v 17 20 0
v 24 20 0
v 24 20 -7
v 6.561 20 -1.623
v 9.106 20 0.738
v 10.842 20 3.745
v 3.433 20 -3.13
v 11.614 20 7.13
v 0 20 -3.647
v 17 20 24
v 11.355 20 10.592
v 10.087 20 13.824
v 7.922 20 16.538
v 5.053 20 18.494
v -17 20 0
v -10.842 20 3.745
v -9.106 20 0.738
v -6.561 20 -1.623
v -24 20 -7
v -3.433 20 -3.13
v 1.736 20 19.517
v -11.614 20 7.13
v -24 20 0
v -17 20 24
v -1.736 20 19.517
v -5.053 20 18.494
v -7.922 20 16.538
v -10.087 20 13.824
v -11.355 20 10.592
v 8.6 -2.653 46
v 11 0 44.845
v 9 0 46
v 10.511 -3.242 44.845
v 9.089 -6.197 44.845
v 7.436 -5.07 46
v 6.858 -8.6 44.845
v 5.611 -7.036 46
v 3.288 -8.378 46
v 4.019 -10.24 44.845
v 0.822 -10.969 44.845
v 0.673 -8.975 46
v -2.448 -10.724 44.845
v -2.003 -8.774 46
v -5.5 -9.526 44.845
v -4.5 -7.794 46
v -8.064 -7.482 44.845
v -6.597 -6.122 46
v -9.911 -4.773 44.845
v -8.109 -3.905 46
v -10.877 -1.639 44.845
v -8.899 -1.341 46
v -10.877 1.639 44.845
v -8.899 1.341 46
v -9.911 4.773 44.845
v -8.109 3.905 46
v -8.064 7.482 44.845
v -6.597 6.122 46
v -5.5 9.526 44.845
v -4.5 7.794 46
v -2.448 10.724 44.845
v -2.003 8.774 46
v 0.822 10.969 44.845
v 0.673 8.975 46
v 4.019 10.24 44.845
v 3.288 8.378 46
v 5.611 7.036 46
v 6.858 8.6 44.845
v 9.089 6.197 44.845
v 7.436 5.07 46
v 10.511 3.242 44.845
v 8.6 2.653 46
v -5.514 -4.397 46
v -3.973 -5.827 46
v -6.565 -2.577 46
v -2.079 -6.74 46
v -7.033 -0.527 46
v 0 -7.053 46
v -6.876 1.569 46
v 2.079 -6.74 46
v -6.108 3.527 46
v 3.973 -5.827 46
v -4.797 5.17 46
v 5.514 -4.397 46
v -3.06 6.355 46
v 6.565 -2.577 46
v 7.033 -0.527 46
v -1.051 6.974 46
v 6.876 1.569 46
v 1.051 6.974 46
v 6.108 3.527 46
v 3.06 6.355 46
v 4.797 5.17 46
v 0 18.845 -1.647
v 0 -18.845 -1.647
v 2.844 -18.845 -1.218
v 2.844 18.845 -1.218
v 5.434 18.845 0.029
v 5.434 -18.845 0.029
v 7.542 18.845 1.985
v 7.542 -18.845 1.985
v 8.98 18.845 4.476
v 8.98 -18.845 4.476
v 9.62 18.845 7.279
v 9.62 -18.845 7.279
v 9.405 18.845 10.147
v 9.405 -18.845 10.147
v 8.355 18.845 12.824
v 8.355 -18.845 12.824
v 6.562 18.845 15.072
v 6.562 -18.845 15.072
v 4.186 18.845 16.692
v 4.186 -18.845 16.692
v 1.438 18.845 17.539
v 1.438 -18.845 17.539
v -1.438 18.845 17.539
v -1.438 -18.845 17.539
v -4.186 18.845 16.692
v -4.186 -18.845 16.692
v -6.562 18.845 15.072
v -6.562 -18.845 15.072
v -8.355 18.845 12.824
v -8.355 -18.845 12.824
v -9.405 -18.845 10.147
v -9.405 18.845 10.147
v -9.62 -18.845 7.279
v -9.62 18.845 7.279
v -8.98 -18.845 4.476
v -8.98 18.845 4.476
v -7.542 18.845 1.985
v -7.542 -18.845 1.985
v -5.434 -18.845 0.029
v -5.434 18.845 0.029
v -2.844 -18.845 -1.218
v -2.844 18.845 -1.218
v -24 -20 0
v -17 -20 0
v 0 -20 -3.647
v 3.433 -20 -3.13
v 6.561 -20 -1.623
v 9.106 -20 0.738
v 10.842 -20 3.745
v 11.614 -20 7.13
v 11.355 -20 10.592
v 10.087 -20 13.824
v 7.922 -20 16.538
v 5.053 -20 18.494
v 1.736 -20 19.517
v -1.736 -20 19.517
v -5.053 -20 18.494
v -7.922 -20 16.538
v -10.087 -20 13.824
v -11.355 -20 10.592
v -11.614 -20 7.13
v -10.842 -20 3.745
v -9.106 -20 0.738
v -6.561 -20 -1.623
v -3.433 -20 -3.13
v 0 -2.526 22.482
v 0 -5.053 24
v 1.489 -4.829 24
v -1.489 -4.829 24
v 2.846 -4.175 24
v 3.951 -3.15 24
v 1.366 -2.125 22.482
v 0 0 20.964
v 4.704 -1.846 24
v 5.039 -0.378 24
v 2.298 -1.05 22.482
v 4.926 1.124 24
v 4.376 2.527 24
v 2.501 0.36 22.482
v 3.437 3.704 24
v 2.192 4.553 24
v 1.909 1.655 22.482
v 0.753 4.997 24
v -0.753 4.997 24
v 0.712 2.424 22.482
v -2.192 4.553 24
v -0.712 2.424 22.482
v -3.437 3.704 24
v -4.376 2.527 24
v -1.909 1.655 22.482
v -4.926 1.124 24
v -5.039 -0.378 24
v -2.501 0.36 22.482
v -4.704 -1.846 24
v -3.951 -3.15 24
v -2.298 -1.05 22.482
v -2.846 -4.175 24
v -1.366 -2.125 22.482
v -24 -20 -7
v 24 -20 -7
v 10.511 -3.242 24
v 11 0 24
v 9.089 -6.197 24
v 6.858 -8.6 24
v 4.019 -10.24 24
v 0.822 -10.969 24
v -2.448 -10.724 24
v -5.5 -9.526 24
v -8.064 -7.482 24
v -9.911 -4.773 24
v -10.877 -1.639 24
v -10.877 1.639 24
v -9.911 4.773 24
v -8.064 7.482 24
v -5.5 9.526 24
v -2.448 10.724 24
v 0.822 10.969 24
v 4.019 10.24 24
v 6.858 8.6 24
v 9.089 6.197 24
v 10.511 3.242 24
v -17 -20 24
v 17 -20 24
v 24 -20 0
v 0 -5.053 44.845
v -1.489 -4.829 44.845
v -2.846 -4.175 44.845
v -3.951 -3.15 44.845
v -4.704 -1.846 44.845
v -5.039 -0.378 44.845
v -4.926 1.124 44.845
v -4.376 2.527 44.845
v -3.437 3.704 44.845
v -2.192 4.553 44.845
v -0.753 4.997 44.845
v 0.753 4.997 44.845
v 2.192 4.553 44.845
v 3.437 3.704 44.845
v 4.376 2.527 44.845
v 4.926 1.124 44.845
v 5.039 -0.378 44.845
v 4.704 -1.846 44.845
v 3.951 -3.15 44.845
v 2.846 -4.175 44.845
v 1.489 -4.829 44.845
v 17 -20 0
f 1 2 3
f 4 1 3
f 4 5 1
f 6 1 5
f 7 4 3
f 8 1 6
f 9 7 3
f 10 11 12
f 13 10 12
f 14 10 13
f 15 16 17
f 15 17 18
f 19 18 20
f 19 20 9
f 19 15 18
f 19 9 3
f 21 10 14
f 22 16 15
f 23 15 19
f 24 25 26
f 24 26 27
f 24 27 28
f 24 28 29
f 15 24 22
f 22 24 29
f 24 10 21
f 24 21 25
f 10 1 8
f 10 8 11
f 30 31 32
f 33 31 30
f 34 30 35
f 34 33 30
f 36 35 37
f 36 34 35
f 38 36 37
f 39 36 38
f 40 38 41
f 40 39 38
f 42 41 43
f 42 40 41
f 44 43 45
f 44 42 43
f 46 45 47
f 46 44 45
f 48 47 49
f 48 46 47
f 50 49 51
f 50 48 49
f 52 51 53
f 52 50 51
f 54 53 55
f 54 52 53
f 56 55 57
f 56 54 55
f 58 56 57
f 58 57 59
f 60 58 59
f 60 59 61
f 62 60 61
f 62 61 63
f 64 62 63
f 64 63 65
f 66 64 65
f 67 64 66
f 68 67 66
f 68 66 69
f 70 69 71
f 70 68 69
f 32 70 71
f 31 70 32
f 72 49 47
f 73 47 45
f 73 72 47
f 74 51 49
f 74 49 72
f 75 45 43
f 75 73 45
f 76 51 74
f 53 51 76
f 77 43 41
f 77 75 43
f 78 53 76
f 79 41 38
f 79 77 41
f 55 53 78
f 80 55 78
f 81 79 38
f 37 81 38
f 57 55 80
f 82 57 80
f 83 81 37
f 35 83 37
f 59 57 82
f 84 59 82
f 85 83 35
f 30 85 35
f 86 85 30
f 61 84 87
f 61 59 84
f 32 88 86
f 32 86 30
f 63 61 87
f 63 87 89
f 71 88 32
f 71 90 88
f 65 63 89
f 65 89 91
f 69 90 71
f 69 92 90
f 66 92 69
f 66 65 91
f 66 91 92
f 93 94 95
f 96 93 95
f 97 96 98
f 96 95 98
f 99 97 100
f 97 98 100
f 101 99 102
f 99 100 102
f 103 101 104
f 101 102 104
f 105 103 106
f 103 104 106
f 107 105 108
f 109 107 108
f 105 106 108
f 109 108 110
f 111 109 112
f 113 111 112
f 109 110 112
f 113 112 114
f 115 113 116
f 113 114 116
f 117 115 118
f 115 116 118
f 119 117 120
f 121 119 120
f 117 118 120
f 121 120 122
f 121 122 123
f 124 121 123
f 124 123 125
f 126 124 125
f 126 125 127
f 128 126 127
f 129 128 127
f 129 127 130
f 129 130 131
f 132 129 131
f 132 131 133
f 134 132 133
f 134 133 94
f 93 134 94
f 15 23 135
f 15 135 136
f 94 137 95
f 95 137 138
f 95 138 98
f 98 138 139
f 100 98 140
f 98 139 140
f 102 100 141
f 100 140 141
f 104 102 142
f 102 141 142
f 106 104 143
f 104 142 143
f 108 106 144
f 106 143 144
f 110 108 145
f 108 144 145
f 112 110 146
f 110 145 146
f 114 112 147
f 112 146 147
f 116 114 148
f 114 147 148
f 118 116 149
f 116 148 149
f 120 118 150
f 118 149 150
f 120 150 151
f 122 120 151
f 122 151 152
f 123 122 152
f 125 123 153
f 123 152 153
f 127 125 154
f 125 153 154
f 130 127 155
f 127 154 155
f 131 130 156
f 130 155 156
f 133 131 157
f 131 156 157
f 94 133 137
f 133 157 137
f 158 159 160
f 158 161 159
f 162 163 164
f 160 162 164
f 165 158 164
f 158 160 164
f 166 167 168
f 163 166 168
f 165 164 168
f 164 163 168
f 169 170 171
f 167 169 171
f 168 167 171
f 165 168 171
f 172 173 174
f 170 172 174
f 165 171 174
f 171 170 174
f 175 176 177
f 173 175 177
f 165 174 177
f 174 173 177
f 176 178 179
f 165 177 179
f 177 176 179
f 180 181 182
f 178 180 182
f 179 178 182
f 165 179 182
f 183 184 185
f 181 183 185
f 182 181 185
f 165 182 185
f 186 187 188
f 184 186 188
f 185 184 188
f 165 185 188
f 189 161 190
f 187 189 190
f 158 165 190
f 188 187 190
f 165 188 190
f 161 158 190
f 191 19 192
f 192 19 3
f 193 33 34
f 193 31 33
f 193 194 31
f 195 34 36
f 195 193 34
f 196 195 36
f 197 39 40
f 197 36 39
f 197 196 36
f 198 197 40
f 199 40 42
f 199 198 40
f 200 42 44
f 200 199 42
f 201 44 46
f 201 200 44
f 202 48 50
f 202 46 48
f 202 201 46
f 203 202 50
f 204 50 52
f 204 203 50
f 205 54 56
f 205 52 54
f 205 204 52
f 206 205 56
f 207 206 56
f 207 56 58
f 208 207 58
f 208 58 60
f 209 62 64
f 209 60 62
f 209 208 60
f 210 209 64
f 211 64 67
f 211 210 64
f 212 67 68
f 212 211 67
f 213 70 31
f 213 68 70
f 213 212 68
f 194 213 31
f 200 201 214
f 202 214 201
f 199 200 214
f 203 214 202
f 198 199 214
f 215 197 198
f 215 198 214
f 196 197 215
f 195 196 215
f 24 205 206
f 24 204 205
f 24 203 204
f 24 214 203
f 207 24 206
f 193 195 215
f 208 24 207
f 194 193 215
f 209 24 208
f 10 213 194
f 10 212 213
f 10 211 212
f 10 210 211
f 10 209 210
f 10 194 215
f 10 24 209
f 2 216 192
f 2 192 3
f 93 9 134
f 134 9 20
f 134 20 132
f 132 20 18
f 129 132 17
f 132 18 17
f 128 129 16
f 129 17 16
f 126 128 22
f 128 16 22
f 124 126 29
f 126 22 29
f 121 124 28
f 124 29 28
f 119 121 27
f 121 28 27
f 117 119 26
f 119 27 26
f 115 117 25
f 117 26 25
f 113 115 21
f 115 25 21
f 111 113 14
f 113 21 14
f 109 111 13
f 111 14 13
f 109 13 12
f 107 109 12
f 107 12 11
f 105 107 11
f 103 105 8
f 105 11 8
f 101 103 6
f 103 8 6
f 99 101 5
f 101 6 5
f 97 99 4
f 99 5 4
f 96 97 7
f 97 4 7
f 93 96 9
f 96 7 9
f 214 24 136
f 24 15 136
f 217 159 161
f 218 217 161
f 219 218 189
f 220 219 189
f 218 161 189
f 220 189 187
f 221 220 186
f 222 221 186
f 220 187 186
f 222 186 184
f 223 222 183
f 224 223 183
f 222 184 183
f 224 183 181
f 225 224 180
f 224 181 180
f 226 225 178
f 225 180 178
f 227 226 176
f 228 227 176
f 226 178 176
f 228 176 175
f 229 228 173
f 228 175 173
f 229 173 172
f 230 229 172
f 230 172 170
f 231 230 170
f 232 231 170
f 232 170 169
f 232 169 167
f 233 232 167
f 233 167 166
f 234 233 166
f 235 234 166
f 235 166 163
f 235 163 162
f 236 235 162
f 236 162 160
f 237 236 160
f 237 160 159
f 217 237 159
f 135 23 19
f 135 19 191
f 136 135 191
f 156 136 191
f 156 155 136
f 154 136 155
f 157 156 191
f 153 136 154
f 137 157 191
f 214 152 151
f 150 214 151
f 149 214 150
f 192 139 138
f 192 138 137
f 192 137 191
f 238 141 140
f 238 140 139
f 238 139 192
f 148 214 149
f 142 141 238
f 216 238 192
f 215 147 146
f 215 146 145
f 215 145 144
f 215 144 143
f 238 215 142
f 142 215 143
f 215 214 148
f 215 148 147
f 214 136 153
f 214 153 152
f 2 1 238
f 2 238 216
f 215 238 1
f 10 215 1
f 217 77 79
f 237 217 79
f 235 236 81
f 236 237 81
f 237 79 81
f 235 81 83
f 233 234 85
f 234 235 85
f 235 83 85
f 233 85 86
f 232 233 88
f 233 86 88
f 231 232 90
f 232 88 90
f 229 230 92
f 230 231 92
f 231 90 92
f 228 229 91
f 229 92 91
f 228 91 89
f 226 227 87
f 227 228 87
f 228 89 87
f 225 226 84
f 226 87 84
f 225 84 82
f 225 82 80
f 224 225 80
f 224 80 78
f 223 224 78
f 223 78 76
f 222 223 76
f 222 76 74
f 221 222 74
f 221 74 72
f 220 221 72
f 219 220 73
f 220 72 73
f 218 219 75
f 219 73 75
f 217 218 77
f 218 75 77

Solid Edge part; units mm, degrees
sketch "Sketch1" plane through (0, 0, 0) normal (0, 0, 1) x (1, 0, 0)
  line L0 (24, -20) -> (24, 20)
  line L1 (24, 20) -> (-24, 20)
  line L2 (-24, 20) -> (-24, -20)
  line L3 (-24, -20) -> (24, -20)
extrude "Protrusion1" add sketch "Sketch1" against normal blind 7
sketch "Sketch2" plane through (0, 0, 0) normal (0, 0, 1) x (1, 0, 0)
  line L0 (17, -20) -> (17, 20)
  line L1 (17, 20) -> (-17, 20)
  line L2 (-17, 20) -> (-17, -20)
  line L3 (-17, -20) -> (17, -20)
extrude "拉伸_2" add sketch "Sketch2" along normal blind 24
sketch "Sketch3" plane through (0, 0, 24) normal (0, 0, 1) x (1, 0, 0)
  circle A0 centre (0, 0) radius 11
extrude "拉伸_3" add sketch "Sketch3" along normal blind 22
hole "孔_1" at (0, 0, 46) direction (0, 0, -1) diameter 10.106 depth 22 tip angle 118 thread major 12 thread length 16
hole "孔_3" at (0, -20, 8) direction (0, 1, 0) diameter 19.294 end up to next
chamfer "倒斜角_2" distance 2 angle 30 4 edges at (-11, 0, 46) (0, 5.053, 46) (-9.647, -20, 8) (0, 20, -1.647) measured on face at (-7.5533, -7.1133, 46) measured on face at (16.48, 20, -1.5233) measured on face at (-16.48, -20, -1.5233)
properties material "钢铁"
